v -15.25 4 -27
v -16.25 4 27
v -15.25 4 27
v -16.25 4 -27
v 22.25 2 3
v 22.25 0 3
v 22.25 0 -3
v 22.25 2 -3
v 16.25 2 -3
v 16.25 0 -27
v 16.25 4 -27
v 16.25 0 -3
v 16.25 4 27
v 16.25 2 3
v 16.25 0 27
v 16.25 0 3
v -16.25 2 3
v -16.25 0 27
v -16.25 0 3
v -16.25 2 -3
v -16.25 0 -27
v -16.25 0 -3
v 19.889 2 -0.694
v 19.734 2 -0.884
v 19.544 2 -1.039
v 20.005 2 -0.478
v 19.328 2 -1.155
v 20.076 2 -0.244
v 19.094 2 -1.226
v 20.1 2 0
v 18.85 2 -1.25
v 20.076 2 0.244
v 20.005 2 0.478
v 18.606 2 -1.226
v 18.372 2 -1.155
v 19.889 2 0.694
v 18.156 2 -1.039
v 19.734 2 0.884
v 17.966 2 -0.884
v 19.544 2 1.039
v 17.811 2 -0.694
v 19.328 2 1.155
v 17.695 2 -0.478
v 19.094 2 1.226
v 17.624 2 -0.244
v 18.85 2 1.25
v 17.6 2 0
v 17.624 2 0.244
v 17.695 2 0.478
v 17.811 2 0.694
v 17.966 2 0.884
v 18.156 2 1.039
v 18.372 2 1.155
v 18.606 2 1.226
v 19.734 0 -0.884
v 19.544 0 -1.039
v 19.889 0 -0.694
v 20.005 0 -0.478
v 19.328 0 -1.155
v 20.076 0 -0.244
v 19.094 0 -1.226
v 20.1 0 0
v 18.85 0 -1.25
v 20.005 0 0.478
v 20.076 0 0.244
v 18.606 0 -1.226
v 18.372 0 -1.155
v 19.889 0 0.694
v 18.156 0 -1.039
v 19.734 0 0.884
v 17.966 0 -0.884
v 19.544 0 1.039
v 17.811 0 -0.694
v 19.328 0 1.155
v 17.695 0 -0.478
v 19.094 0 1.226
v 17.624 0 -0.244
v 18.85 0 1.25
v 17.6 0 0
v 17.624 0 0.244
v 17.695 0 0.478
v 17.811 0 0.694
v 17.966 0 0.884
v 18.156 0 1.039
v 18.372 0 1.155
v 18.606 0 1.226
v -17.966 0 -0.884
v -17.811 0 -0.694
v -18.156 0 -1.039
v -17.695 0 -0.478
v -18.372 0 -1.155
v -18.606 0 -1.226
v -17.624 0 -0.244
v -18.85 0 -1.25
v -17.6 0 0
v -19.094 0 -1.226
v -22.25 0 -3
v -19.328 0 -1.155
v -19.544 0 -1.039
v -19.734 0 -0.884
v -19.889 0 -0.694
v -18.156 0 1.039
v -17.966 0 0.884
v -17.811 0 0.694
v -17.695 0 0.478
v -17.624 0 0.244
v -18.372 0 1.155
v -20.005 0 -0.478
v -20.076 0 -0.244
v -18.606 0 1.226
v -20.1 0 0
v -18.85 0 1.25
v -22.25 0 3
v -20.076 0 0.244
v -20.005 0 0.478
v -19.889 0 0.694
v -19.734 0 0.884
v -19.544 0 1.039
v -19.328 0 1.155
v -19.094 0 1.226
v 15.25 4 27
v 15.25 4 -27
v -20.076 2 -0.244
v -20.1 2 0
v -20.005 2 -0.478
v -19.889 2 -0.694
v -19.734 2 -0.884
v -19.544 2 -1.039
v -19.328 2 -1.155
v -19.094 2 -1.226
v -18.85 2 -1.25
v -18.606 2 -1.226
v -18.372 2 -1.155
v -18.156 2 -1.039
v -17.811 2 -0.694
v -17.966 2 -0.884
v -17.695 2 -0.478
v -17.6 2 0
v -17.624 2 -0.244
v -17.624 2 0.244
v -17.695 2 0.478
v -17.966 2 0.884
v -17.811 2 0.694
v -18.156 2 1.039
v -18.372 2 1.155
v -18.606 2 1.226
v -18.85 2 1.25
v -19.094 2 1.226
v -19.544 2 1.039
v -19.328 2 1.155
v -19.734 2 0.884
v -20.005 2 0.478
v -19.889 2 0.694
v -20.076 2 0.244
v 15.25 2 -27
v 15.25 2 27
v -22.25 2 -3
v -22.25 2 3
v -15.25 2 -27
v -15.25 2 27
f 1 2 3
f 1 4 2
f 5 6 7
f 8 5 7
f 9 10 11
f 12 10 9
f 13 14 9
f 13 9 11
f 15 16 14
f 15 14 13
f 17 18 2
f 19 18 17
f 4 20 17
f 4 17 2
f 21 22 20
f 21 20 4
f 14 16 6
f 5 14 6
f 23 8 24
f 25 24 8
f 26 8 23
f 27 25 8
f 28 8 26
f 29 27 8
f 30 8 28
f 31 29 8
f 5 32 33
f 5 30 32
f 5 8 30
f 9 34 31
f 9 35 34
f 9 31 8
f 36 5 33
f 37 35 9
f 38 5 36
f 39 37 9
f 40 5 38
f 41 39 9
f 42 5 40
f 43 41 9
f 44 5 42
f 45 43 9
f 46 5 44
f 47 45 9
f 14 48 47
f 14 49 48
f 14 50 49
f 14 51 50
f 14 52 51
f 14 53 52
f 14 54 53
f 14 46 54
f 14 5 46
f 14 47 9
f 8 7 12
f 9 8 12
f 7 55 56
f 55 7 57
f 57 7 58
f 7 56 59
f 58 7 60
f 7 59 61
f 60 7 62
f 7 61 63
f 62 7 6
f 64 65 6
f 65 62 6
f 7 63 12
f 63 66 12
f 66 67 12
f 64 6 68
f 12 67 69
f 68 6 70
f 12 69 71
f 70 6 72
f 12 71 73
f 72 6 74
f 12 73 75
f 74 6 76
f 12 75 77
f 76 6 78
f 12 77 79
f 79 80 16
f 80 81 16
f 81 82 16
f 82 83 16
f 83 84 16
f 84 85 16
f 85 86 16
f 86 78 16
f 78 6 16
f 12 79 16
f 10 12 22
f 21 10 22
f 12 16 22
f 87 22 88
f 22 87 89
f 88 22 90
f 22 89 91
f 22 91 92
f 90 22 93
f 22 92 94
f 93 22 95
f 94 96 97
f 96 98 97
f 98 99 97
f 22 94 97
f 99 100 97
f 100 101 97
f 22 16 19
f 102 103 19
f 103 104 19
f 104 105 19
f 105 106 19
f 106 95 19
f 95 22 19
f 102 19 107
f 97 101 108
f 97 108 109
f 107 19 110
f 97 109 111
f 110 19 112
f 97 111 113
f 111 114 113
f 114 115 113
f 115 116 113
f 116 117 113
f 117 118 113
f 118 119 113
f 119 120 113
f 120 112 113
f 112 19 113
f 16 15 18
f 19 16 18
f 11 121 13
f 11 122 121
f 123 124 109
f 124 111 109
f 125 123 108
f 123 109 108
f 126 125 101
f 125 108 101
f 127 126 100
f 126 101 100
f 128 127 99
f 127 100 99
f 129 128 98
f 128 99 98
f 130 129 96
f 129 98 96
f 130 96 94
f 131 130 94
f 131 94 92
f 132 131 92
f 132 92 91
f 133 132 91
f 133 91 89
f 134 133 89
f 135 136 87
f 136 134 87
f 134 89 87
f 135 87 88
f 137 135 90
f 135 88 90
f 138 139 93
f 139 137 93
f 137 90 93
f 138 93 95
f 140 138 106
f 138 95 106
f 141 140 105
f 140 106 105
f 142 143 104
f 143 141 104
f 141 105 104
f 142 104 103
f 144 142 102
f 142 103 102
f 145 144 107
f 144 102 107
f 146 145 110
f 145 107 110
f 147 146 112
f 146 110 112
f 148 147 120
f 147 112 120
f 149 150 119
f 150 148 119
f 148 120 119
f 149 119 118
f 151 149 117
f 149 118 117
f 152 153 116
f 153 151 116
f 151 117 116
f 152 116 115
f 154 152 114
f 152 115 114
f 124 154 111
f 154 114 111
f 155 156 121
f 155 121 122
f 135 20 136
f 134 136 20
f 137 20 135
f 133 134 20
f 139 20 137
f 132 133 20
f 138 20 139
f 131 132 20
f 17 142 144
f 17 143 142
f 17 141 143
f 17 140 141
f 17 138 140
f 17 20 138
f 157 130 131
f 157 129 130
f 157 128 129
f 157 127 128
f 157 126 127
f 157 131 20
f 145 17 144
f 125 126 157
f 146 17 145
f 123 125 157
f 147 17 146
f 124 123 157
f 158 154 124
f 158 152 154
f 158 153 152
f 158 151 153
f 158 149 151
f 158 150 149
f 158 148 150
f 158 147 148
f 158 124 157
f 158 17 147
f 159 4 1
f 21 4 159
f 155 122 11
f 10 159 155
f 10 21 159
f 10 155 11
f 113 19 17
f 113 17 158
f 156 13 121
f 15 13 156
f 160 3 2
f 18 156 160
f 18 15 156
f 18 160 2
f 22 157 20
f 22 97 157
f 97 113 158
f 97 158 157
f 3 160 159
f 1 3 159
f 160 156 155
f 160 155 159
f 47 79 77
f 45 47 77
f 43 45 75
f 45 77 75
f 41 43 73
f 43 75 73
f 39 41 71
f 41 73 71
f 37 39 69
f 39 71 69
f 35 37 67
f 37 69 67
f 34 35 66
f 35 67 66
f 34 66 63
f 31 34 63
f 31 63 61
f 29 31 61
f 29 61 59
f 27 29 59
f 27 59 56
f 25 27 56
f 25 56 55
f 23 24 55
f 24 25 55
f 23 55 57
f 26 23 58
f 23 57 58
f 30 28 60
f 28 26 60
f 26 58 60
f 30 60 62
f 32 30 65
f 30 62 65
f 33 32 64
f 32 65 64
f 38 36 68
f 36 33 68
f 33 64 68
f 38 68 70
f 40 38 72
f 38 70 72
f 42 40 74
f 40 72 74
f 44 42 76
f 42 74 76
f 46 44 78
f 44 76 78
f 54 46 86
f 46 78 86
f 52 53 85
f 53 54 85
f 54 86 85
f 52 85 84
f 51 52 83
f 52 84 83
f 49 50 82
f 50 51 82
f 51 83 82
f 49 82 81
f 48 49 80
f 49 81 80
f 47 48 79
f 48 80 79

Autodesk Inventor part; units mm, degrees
ref_plane "YZ Plane" through (0, 0, 0) normal (1, 0, 0) x (0, 1, 0)
ref_plane "XZ Plane" through (0, 0, 0) normal (0, 1, 0) x (-1, 0, 0)
ref_plane "XY Plane" through (0, 0, 0) normal (0, 0, 1) x (1, 0, 0)
sketch "Sketch1" plane through (0, 0, 0) normal (0, 1, 0) x (-1, 0, 0)
  line L0 (-16.25, 27) -> (16.25, 27)
  line L1 (16.25, 27) -> (16.25, -27)
  line L2 (16.25, -27) -> (-16.25, -27)
  line L3 (-16.25, -27) -> (-16.25, 27)
  line L4 (-16.25, 27) -> (16.25, -27) construction
  line L5 (16.25, 27) -> (-16.25, -27) construction
  line L6 (16.25, 3) -> (22.25, 3)
  line L7 (22.25, 3) -> (22.25, -3)
  line L8 (22.25, -3) -> (16.25, -3)
  line L9 (16.25, -3) -> (16.25, 3)
  line L10 (-16.25, 3) -> (-22.25, 3)
  line L11 (-22.25, 3) -> (-22.25, -3)
  line L12 (-22.25, -3) -> (-16.25, -3)
  line L13 (-16.25, -3) -> (-16.25, 3)
  circle A0 centre (18.85, 0) radius 1.25
  circle A1 centre (-18.85, 0) radius 1.25
  point P0 (0, 0)
  point P1 (19.25, -3)
  point P2 (19.25, 3)
  point P3 (22.25, 0)
  point P4 (16.25, 0)
  point P5 (-22.25, 0)
  point P6 (-16.25, 0)
  dimension "d0" = 54
  dimension "d1" = 32.5
  dimension "d12" = 6
  dimension "d13" = 6
  dimension "d14" = 6
  dimension "d15" = 6
  dimension "d16" = 2.5
  dimension "d17" = 2.5
  dimension "d18" = 2.6
  dimension "d19" = 37.7
  dimension "d20" = 3
  dimension "d21" = 3
extrude "Extrusion1" add sketch "Sketch1" along normal blind 2
sketch "Sketch2" plane through (0, 2, 0) normal (0, 1, 0) x (1, 0, 0)
  line L0 (-16.25, -27) -> (16.25, -27) projected
  line L1 (-16.25, 27) -> (-16.25, -27) projected
  line L2 (16.25, 27) -> (-16.25, 27) projected
  line L3 (-16.25, -27) -> (-15.25, -27)
  line L4 (-15.25, -27) -> (-15.25, 27)
  line L5 (-15.25, 27) -> (-16.25, 27)
  line L6 (-16.25, 27) -> (-16.25, -27)
  line L7 (0, -27) -> (0, 27) construction
  line L8 (16.25, -27) -> (15.25, -27)
  line L9 (15.25, -27) -> (15.25, 27)
  line L10 (15.25, 27) -> (16.25, 27)
  line L11 (16.25, 27) -> (16.25, -27)
  point P0 (0, 0)
  dimension "d4" = 1
  dimension "d5" = 1
extrude "Extrusion2" add sketch "Sketch2" along normal blind 2 contours L1 L2 L4 L0 | L9 L2 L11 L0
properties part number "Bateria_Podkladka"
